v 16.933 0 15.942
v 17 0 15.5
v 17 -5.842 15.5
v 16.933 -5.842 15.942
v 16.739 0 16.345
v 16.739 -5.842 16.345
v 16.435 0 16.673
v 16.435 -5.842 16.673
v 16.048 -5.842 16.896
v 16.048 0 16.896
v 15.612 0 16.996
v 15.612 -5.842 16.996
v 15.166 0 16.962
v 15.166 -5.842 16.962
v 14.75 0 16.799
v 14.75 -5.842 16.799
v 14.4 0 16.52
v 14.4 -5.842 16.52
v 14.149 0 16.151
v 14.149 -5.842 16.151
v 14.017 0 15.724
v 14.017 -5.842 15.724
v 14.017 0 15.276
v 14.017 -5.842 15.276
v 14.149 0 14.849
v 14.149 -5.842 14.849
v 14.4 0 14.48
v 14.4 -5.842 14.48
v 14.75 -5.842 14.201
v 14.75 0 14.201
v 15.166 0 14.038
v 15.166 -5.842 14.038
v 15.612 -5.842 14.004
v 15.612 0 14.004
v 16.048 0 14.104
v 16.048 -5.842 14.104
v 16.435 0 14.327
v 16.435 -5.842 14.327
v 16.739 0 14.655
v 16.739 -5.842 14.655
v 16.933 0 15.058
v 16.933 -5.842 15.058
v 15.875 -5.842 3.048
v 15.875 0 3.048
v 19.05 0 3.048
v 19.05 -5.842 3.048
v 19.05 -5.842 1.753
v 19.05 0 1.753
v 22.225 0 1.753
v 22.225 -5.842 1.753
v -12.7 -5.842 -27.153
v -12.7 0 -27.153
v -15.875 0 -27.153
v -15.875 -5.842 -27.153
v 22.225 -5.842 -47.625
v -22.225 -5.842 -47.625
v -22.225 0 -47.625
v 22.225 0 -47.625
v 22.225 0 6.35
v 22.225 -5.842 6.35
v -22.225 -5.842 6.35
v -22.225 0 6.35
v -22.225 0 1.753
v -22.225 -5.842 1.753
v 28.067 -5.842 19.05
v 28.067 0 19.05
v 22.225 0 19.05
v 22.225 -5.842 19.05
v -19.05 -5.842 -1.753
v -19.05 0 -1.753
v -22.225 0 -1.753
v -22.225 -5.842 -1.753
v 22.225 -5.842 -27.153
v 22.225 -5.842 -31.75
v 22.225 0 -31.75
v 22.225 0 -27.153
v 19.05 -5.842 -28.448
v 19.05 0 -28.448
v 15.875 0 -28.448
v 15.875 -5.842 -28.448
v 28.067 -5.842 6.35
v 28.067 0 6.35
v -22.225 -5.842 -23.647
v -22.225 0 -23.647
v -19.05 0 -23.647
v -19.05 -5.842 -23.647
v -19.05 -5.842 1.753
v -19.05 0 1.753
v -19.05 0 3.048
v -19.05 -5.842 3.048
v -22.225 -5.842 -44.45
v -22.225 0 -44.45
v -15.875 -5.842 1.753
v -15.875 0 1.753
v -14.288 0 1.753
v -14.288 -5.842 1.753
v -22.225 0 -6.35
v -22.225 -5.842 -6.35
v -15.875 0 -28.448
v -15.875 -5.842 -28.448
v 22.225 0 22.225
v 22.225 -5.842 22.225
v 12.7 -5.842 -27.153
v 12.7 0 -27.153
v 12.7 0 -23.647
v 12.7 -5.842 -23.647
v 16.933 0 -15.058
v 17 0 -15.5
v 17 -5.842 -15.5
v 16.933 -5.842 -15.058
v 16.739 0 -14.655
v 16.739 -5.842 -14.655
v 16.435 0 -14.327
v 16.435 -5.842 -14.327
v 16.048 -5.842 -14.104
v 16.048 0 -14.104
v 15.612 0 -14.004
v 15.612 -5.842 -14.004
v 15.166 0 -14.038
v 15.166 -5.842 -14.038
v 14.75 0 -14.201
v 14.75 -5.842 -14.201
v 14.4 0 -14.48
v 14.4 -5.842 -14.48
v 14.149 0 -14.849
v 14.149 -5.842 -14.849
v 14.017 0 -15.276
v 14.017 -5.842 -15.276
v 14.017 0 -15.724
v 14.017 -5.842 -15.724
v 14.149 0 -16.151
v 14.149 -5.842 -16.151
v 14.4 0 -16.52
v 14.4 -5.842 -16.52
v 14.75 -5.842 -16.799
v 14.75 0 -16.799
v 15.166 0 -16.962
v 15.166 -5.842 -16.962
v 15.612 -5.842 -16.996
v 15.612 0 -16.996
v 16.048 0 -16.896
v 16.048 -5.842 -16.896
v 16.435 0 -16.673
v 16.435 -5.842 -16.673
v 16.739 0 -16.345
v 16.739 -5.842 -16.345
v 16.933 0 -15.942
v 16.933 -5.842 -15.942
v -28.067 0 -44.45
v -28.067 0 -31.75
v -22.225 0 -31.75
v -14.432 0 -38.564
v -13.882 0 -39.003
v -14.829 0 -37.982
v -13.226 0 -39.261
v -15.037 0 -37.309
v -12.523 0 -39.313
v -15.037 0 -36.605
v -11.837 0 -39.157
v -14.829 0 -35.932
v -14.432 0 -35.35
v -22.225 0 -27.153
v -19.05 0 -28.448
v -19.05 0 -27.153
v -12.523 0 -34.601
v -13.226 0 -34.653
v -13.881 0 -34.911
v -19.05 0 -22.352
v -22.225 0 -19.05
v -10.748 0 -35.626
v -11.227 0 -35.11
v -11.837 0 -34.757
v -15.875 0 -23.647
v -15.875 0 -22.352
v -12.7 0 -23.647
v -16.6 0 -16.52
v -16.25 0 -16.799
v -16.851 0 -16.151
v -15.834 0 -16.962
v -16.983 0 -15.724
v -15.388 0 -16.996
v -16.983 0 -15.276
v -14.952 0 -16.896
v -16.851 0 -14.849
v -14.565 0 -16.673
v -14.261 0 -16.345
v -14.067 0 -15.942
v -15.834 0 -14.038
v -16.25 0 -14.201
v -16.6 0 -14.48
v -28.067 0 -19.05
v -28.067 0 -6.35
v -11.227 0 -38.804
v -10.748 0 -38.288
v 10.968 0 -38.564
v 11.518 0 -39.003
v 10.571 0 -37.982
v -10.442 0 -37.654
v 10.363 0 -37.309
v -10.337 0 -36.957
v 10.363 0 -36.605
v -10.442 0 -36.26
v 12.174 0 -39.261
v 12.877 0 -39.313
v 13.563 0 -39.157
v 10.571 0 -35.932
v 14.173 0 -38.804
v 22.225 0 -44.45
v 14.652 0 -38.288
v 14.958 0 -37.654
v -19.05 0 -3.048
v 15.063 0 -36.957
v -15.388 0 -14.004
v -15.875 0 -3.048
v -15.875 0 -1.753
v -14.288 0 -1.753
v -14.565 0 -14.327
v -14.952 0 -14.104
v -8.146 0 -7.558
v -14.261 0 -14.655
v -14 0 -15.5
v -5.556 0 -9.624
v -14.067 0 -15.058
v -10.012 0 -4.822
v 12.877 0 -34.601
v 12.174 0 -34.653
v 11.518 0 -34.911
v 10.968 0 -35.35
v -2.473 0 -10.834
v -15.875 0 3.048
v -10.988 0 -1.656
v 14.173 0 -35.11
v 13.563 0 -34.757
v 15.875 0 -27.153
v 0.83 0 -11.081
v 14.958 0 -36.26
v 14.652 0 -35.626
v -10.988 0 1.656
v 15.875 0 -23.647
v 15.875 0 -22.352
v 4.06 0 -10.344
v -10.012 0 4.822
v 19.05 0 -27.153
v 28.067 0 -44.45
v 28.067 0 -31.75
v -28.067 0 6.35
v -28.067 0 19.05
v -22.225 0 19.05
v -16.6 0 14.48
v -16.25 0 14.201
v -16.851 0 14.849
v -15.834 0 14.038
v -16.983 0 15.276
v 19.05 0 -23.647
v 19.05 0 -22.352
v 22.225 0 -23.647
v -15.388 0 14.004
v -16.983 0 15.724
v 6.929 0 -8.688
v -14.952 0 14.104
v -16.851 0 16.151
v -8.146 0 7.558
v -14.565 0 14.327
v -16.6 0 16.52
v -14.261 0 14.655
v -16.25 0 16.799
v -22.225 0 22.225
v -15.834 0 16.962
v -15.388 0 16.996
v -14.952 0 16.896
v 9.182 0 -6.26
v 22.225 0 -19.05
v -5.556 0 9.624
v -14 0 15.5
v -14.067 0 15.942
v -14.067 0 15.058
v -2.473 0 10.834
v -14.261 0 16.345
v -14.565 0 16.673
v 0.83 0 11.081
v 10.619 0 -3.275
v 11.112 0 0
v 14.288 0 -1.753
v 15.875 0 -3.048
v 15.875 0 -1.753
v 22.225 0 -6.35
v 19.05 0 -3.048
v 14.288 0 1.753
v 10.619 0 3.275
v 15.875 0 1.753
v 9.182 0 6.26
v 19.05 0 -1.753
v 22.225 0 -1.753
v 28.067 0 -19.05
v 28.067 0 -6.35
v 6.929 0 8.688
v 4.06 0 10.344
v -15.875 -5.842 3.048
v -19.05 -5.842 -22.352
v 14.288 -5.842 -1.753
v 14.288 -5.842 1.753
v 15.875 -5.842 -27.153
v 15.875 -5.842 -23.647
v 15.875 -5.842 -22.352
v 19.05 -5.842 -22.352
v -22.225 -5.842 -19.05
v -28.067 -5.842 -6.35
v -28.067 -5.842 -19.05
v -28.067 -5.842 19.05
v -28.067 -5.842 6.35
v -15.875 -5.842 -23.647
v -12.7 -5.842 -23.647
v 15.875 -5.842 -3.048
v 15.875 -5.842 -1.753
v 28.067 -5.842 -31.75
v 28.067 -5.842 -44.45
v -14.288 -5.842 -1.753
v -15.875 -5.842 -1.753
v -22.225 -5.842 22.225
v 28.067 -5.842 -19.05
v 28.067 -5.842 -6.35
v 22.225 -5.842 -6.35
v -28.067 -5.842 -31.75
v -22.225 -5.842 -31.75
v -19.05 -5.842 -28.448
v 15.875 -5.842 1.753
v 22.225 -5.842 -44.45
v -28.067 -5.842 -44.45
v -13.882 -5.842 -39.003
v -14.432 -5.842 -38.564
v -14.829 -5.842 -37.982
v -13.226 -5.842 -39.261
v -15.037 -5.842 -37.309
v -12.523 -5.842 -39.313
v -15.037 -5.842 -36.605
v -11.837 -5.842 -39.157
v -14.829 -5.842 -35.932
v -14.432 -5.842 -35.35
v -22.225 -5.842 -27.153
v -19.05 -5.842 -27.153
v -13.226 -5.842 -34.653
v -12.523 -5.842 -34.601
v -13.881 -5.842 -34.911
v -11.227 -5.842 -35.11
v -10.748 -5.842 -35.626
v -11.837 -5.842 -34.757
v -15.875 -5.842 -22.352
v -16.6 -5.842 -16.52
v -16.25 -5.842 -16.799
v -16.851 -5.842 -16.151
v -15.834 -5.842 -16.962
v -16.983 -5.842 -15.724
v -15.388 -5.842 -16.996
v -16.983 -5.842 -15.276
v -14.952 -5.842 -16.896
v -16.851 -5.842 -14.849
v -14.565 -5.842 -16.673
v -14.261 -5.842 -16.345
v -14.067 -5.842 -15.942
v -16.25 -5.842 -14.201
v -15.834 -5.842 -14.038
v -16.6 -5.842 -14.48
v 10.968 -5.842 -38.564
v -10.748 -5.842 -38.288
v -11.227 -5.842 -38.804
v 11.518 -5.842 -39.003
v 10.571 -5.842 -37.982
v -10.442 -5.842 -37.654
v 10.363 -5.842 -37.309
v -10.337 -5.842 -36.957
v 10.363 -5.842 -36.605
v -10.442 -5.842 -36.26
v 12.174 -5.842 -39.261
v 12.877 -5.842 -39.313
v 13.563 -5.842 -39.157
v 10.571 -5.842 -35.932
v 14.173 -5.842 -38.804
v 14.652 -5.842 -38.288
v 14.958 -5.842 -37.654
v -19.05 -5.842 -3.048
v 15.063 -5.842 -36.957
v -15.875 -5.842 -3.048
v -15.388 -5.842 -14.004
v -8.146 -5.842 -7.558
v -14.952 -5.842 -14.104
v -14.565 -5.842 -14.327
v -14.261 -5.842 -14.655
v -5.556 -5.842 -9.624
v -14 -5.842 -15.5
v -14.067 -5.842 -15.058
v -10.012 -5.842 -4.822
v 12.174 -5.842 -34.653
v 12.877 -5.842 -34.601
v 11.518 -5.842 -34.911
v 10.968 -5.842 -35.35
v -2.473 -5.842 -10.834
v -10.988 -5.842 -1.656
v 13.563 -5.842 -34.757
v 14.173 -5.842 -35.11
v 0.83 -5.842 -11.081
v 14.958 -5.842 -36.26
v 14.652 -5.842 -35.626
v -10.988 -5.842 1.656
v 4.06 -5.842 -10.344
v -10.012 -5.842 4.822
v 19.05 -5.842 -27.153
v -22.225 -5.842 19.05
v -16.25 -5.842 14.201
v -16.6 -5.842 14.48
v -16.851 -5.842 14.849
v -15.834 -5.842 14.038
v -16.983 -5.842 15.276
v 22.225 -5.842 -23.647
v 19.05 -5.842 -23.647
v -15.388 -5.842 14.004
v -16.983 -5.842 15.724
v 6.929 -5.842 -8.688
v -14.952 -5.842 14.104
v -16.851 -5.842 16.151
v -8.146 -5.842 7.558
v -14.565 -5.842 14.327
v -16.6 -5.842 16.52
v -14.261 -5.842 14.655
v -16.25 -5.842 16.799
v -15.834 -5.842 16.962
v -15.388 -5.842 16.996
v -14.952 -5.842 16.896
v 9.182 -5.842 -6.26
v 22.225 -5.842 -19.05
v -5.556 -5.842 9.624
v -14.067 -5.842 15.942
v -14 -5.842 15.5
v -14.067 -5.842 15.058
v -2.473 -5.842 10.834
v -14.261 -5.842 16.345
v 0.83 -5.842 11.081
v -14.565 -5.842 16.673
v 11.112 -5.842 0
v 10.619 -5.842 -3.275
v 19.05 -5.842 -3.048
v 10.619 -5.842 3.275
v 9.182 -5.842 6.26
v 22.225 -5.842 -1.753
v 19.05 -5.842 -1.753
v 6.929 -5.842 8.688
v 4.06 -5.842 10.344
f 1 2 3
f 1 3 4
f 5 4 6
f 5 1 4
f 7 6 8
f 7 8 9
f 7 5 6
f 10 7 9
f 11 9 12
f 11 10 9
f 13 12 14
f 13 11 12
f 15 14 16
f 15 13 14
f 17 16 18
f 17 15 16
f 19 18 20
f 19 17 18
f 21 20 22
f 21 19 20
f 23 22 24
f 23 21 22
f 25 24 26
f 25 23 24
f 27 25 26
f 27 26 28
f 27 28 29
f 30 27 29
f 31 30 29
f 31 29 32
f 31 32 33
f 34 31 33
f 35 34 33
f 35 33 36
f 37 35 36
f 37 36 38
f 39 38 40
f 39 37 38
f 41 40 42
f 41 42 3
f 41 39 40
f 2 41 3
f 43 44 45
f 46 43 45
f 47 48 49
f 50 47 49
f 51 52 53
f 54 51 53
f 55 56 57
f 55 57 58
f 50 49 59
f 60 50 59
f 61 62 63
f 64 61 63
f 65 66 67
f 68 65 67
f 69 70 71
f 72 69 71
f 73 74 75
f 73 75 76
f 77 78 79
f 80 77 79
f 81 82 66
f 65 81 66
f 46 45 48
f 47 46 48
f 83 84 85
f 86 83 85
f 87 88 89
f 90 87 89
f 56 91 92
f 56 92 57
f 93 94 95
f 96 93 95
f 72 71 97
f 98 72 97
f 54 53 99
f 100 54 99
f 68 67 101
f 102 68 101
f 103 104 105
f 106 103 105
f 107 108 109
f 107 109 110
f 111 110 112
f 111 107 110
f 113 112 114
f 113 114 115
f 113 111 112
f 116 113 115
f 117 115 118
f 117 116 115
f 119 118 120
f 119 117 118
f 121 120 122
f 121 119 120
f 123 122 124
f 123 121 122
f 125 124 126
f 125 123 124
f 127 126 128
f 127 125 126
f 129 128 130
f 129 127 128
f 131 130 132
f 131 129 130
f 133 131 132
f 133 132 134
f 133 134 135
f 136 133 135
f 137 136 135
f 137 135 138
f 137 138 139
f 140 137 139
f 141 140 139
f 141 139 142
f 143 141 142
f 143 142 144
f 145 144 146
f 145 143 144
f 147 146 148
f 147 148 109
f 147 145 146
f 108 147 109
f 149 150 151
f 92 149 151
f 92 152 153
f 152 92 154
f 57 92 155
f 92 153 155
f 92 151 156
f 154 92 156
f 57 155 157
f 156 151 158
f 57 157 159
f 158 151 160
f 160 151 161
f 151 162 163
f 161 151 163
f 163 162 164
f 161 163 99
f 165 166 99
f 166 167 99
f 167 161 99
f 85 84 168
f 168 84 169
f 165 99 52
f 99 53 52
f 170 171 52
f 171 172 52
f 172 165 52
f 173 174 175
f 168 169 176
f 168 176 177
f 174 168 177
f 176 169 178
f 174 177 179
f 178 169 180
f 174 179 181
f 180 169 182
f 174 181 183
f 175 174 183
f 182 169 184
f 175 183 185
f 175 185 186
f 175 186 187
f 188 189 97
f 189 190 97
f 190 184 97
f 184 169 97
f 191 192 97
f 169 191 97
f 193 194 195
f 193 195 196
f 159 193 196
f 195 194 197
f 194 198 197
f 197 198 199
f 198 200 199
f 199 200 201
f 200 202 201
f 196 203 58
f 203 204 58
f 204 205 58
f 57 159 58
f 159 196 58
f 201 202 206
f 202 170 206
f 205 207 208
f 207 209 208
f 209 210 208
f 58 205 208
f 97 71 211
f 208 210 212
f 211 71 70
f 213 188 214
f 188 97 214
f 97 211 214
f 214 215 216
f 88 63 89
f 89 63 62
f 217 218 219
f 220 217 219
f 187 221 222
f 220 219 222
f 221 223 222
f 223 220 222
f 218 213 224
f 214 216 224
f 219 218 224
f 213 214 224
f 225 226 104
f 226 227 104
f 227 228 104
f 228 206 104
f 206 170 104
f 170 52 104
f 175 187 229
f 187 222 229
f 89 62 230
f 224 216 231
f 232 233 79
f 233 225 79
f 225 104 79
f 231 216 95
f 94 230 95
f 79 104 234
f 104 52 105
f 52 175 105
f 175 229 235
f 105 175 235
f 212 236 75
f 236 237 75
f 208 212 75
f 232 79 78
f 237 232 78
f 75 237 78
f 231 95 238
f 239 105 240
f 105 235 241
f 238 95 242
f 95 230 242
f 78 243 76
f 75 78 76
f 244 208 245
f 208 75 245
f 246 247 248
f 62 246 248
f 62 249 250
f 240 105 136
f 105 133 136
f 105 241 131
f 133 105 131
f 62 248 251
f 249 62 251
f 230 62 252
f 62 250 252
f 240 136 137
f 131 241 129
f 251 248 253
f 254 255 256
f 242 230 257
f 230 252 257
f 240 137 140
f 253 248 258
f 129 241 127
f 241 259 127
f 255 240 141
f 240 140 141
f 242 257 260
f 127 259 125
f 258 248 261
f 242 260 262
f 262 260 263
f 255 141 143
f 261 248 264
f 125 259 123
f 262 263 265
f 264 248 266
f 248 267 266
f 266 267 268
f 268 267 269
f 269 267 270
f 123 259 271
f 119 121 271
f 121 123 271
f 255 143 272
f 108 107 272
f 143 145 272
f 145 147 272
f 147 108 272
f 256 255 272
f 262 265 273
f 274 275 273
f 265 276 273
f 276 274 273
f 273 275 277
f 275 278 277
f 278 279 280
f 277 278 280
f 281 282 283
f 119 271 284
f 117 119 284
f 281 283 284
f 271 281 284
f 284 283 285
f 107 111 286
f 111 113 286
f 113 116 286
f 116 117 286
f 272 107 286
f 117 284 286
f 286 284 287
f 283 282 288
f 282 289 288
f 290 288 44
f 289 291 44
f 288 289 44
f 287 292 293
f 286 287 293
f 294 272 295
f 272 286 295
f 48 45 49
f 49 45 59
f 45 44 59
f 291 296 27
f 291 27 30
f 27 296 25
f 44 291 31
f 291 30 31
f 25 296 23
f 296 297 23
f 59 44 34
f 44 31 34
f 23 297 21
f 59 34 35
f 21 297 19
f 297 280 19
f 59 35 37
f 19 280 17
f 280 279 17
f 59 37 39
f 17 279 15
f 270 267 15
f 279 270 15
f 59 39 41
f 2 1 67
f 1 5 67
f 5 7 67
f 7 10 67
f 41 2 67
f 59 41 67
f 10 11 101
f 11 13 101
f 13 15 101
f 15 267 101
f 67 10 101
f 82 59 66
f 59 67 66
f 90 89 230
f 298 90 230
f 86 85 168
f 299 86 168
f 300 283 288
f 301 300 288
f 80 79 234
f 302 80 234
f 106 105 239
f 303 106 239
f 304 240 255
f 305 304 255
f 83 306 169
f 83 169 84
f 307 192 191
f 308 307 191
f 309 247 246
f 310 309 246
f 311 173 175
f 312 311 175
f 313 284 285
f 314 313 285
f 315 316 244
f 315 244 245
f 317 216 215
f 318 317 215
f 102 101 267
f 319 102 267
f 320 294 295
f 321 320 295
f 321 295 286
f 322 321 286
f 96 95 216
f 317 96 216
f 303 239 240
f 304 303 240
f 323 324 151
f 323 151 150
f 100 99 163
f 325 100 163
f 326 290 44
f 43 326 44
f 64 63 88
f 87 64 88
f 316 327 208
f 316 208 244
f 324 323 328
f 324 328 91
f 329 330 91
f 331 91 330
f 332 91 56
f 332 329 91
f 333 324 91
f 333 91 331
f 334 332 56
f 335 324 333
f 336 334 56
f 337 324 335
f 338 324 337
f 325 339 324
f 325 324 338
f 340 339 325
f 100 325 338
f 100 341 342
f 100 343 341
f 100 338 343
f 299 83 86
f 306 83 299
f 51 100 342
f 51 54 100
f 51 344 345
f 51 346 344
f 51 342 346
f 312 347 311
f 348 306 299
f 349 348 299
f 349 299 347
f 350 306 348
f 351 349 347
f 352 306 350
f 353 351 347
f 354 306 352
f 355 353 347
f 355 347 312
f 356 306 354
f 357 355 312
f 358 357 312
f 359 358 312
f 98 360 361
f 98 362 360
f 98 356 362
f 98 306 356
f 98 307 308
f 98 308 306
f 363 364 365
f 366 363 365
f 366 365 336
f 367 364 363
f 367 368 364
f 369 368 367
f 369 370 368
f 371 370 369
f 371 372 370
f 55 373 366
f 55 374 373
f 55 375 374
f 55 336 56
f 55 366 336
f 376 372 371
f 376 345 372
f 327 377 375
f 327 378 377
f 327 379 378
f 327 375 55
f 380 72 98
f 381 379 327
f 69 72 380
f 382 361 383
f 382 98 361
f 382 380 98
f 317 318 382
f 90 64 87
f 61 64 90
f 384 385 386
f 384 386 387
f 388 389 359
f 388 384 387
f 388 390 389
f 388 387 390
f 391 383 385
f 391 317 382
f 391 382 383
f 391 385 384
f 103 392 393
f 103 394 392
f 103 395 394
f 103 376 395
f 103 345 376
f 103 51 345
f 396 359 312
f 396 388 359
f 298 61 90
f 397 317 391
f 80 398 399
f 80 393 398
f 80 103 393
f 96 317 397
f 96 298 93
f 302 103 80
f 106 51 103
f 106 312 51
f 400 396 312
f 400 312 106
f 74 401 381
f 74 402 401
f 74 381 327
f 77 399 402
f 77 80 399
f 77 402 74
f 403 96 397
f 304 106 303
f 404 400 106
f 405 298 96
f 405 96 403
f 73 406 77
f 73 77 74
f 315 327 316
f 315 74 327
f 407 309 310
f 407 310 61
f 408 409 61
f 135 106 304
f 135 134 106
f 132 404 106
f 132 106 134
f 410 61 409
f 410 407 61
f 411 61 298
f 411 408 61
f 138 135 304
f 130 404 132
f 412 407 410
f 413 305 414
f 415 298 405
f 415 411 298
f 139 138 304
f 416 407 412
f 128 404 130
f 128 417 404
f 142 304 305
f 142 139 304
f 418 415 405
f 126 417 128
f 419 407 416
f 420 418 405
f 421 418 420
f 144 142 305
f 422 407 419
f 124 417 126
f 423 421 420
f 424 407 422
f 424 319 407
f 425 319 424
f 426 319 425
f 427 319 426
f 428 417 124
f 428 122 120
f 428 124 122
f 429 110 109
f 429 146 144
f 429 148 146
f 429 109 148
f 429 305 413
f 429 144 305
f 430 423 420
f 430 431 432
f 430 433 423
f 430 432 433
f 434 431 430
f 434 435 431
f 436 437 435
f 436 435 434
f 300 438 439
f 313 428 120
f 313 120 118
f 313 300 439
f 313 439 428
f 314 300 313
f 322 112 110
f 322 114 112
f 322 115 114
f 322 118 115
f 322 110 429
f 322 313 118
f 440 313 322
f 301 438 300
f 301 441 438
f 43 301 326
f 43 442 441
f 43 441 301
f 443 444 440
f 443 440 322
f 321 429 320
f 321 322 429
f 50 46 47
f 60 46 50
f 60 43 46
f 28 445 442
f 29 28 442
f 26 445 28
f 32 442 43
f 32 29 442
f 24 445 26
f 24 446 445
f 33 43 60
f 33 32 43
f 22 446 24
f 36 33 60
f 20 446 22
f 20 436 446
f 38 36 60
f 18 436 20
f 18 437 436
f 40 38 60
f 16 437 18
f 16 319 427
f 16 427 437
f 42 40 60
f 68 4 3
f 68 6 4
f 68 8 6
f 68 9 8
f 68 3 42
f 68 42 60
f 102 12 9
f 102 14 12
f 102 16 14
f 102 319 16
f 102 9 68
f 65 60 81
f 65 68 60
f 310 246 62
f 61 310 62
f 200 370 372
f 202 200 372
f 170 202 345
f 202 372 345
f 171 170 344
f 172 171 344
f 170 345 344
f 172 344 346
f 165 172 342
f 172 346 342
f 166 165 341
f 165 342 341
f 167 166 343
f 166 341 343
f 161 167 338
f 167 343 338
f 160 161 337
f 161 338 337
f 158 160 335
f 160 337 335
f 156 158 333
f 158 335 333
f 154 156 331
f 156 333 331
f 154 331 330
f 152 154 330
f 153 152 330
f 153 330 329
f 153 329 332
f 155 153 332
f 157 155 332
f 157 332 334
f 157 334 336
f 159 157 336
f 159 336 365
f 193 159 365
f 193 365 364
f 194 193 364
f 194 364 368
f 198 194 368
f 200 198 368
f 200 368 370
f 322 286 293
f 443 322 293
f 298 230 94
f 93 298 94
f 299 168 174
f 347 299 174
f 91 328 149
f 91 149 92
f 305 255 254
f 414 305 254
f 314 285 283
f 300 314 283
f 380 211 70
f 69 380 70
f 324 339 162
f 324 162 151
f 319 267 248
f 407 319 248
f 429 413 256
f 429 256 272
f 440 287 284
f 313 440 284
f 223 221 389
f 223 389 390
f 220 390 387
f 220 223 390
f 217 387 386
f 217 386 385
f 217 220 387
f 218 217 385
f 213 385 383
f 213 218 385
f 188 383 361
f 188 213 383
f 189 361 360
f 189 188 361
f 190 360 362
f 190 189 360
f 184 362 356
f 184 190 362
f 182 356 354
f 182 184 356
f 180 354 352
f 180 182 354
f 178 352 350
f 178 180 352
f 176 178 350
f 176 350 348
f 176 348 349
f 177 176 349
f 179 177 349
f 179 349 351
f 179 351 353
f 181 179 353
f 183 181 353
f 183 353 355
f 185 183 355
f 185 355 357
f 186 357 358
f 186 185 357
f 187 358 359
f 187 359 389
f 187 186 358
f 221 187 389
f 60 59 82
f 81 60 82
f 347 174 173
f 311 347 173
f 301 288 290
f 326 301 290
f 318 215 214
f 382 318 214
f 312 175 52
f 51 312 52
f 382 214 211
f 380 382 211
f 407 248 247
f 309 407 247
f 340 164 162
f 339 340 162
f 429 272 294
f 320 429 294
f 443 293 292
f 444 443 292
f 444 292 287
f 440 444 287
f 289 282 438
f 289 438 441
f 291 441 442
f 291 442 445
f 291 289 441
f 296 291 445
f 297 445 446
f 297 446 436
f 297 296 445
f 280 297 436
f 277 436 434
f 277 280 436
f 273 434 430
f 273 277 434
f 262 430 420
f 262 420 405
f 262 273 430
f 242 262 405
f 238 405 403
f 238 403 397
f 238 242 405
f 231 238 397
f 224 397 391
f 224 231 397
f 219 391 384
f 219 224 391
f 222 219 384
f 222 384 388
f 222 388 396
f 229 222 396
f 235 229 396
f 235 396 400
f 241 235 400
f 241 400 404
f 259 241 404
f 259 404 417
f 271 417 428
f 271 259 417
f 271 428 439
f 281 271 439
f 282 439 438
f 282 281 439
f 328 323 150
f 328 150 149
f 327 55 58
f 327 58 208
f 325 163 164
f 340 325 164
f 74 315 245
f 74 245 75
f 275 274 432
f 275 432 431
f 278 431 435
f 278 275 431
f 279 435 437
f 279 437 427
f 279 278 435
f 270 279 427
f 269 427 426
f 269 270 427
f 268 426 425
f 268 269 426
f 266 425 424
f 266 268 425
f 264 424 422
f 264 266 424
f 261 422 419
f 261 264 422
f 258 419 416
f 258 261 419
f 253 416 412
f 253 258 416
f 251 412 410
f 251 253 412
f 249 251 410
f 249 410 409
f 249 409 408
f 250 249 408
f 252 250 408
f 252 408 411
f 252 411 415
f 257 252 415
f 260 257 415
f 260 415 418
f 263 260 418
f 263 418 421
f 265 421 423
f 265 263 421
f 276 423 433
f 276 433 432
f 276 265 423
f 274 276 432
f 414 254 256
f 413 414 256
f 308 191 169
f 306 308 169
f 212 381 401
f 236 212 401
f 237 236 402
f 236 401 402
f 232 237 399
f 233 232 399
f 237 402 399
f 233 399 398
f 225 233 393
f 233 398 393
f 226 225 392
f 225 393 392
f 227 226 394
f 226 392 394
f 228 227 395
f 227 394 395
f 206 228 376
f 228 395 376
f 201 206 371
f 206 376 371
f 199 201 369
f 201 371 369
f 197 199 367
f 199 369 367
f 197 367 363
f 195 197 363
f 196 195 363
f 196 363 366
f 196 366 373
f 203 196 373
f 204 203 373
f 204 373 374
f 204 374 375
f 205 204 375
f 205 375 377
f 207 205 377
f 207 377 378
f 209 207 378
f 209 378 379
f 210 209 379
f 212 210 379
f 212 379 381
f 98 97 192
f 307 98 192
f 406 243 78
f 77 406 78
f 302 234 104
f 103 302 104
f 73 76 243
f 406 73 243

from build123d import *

# Parameters (mm, degrees)
F0_R     = 1.5
F0_R_2   = 11.1125
F1_DEPTH = 5.842
F3_DEPTH = 5.842
F5_DEPTH = 25.4
F6_R     = 2.363
F7_DEPTH = 25.4


with BuildPart() as f1:
    # F0 (on Front) → F1 (new body)
    with BuildSketch(Plane.XZ):
        Polygon((22.225, 22.225), (-22.225, 22.225), (-22.225, 19.05), (-28.067, 19.05), (-28.067, 6.35), (-22.225, 6.35), (-22.225, 1.7526), (-19.05, 1.7526), (-19.05, 3.048), (-15.875, 3.048), (-15.875, 1.7526), (-14.2875, 1.7526), (-14.2875, -1.7526), (-15.875, -1.7526), (-15.875, -3.048), (-19.05, -3.048), (-19.05, -1.7526), (-22.225, -1.7526), (-22.225, -6.35), (-28.067, -6.35), (-28.067, -19.05), (-22.225, -19.05), (-22.225, -22.225), (22.225, -22.225), (22.225, -19.05), (28.067, -19.05), (28.067, -6.35), (22.225, -6.35), (22.225, -1.7526), (19.05, -1.7526), (19.05, -3.048), (15.875, -3.048), (15.875, -1.7526), (14.2875, -1.7526), (14.2875, 1.7526), (15.875, 1.7526), (15.875, 3.048), (19.05, 3.048), (19.05, 1.7526), (22.225, 1.7526), (22.225, 6.35), (28.067, 6.35), (28.067, 19.05), (22.225, 19.05), align=None)
        with Locations((-15.5, -15.5)):
            Circle(F0_R, mode=Mode.SUBTRACT)
        with Locations((15.5, -15.5)):
            Circle(F0_R, mode=Mode.SUBTRACT)
        with Locations((-15.5, 15.5)):
            Circle(F0_R, mode=Mode.SUBTRACT)
        Circle(F0_R_2, mode=Mode.SUBTRACT)
        with Locations((15.5, 15.5)):
            Circle(F0_R, mode=Mode.SUBTRACT)
    extrude(amount=F1_DEPTH)

    # F2 (on face) → F3 (join, through all)
    with BuildSketch(Plane.XZ.offset(5.842)):
        Polygon((22.225, -22.225), (-22.225, -22.225), (-22.225, -31.75), (-28.067, -31.75), (-28.067, -44.45), (-22.225, -44.45), (-22.225, -47.625), (22.225, -47.625), (22.225, -44.45), (28.067, -44.45), (28.067, -31.75), (22.225, -31.75), align=None)
    extrude(amount=-F3_DEPTH)

    # F4 (on face) → F5 (cut)
    with BuildSketch(Plane(origin=(0, 0, 0), x_dir=(-1, 0, 0), z_dir=(0, 1, 0))):
        Polygon((22.225, -27.1526), (22.225, -23.6474), (19.05, -23.6474), (19.05, -22.352), (15.875, -22.352), (15.875, -23.6474), (12.7, -23.6474), (12.7, -27.1526), (15.875, -27.1526), (15.875, -28.448), (19.05, -28.448), (19.05, -27.1526), align=None)
        Polygon((-22.225, -27.1526), (-19.05, -27.1526), (-19.05, -28.448), (-15.875, -28.448), (-15.875, -27.1526), (-12.7, -27.1526), (-12.7, -23.6474), (-15.875, -23.6474), (-15.875, -22.352), (-19.05, -22.352), (-19.05, -23.6474), (-22.225, -23.6474), align=None)
    extrude(amount=-F5_DEPTH, mode=Mode.SUBTRACT)

    # F6 (on face) → F7 (cut)
    with BuildSketch(Plane.XZ.offset(5.842)):
        with Locations((-12.7, -36.957)):
            Circle(F6_R)
        with Locations((12.7, -36.957)):
            Circle(F6_R)
    extrude(amount=-F7_DEPTH, mode=Mode.SUBTRACT)


solid = f1.part
